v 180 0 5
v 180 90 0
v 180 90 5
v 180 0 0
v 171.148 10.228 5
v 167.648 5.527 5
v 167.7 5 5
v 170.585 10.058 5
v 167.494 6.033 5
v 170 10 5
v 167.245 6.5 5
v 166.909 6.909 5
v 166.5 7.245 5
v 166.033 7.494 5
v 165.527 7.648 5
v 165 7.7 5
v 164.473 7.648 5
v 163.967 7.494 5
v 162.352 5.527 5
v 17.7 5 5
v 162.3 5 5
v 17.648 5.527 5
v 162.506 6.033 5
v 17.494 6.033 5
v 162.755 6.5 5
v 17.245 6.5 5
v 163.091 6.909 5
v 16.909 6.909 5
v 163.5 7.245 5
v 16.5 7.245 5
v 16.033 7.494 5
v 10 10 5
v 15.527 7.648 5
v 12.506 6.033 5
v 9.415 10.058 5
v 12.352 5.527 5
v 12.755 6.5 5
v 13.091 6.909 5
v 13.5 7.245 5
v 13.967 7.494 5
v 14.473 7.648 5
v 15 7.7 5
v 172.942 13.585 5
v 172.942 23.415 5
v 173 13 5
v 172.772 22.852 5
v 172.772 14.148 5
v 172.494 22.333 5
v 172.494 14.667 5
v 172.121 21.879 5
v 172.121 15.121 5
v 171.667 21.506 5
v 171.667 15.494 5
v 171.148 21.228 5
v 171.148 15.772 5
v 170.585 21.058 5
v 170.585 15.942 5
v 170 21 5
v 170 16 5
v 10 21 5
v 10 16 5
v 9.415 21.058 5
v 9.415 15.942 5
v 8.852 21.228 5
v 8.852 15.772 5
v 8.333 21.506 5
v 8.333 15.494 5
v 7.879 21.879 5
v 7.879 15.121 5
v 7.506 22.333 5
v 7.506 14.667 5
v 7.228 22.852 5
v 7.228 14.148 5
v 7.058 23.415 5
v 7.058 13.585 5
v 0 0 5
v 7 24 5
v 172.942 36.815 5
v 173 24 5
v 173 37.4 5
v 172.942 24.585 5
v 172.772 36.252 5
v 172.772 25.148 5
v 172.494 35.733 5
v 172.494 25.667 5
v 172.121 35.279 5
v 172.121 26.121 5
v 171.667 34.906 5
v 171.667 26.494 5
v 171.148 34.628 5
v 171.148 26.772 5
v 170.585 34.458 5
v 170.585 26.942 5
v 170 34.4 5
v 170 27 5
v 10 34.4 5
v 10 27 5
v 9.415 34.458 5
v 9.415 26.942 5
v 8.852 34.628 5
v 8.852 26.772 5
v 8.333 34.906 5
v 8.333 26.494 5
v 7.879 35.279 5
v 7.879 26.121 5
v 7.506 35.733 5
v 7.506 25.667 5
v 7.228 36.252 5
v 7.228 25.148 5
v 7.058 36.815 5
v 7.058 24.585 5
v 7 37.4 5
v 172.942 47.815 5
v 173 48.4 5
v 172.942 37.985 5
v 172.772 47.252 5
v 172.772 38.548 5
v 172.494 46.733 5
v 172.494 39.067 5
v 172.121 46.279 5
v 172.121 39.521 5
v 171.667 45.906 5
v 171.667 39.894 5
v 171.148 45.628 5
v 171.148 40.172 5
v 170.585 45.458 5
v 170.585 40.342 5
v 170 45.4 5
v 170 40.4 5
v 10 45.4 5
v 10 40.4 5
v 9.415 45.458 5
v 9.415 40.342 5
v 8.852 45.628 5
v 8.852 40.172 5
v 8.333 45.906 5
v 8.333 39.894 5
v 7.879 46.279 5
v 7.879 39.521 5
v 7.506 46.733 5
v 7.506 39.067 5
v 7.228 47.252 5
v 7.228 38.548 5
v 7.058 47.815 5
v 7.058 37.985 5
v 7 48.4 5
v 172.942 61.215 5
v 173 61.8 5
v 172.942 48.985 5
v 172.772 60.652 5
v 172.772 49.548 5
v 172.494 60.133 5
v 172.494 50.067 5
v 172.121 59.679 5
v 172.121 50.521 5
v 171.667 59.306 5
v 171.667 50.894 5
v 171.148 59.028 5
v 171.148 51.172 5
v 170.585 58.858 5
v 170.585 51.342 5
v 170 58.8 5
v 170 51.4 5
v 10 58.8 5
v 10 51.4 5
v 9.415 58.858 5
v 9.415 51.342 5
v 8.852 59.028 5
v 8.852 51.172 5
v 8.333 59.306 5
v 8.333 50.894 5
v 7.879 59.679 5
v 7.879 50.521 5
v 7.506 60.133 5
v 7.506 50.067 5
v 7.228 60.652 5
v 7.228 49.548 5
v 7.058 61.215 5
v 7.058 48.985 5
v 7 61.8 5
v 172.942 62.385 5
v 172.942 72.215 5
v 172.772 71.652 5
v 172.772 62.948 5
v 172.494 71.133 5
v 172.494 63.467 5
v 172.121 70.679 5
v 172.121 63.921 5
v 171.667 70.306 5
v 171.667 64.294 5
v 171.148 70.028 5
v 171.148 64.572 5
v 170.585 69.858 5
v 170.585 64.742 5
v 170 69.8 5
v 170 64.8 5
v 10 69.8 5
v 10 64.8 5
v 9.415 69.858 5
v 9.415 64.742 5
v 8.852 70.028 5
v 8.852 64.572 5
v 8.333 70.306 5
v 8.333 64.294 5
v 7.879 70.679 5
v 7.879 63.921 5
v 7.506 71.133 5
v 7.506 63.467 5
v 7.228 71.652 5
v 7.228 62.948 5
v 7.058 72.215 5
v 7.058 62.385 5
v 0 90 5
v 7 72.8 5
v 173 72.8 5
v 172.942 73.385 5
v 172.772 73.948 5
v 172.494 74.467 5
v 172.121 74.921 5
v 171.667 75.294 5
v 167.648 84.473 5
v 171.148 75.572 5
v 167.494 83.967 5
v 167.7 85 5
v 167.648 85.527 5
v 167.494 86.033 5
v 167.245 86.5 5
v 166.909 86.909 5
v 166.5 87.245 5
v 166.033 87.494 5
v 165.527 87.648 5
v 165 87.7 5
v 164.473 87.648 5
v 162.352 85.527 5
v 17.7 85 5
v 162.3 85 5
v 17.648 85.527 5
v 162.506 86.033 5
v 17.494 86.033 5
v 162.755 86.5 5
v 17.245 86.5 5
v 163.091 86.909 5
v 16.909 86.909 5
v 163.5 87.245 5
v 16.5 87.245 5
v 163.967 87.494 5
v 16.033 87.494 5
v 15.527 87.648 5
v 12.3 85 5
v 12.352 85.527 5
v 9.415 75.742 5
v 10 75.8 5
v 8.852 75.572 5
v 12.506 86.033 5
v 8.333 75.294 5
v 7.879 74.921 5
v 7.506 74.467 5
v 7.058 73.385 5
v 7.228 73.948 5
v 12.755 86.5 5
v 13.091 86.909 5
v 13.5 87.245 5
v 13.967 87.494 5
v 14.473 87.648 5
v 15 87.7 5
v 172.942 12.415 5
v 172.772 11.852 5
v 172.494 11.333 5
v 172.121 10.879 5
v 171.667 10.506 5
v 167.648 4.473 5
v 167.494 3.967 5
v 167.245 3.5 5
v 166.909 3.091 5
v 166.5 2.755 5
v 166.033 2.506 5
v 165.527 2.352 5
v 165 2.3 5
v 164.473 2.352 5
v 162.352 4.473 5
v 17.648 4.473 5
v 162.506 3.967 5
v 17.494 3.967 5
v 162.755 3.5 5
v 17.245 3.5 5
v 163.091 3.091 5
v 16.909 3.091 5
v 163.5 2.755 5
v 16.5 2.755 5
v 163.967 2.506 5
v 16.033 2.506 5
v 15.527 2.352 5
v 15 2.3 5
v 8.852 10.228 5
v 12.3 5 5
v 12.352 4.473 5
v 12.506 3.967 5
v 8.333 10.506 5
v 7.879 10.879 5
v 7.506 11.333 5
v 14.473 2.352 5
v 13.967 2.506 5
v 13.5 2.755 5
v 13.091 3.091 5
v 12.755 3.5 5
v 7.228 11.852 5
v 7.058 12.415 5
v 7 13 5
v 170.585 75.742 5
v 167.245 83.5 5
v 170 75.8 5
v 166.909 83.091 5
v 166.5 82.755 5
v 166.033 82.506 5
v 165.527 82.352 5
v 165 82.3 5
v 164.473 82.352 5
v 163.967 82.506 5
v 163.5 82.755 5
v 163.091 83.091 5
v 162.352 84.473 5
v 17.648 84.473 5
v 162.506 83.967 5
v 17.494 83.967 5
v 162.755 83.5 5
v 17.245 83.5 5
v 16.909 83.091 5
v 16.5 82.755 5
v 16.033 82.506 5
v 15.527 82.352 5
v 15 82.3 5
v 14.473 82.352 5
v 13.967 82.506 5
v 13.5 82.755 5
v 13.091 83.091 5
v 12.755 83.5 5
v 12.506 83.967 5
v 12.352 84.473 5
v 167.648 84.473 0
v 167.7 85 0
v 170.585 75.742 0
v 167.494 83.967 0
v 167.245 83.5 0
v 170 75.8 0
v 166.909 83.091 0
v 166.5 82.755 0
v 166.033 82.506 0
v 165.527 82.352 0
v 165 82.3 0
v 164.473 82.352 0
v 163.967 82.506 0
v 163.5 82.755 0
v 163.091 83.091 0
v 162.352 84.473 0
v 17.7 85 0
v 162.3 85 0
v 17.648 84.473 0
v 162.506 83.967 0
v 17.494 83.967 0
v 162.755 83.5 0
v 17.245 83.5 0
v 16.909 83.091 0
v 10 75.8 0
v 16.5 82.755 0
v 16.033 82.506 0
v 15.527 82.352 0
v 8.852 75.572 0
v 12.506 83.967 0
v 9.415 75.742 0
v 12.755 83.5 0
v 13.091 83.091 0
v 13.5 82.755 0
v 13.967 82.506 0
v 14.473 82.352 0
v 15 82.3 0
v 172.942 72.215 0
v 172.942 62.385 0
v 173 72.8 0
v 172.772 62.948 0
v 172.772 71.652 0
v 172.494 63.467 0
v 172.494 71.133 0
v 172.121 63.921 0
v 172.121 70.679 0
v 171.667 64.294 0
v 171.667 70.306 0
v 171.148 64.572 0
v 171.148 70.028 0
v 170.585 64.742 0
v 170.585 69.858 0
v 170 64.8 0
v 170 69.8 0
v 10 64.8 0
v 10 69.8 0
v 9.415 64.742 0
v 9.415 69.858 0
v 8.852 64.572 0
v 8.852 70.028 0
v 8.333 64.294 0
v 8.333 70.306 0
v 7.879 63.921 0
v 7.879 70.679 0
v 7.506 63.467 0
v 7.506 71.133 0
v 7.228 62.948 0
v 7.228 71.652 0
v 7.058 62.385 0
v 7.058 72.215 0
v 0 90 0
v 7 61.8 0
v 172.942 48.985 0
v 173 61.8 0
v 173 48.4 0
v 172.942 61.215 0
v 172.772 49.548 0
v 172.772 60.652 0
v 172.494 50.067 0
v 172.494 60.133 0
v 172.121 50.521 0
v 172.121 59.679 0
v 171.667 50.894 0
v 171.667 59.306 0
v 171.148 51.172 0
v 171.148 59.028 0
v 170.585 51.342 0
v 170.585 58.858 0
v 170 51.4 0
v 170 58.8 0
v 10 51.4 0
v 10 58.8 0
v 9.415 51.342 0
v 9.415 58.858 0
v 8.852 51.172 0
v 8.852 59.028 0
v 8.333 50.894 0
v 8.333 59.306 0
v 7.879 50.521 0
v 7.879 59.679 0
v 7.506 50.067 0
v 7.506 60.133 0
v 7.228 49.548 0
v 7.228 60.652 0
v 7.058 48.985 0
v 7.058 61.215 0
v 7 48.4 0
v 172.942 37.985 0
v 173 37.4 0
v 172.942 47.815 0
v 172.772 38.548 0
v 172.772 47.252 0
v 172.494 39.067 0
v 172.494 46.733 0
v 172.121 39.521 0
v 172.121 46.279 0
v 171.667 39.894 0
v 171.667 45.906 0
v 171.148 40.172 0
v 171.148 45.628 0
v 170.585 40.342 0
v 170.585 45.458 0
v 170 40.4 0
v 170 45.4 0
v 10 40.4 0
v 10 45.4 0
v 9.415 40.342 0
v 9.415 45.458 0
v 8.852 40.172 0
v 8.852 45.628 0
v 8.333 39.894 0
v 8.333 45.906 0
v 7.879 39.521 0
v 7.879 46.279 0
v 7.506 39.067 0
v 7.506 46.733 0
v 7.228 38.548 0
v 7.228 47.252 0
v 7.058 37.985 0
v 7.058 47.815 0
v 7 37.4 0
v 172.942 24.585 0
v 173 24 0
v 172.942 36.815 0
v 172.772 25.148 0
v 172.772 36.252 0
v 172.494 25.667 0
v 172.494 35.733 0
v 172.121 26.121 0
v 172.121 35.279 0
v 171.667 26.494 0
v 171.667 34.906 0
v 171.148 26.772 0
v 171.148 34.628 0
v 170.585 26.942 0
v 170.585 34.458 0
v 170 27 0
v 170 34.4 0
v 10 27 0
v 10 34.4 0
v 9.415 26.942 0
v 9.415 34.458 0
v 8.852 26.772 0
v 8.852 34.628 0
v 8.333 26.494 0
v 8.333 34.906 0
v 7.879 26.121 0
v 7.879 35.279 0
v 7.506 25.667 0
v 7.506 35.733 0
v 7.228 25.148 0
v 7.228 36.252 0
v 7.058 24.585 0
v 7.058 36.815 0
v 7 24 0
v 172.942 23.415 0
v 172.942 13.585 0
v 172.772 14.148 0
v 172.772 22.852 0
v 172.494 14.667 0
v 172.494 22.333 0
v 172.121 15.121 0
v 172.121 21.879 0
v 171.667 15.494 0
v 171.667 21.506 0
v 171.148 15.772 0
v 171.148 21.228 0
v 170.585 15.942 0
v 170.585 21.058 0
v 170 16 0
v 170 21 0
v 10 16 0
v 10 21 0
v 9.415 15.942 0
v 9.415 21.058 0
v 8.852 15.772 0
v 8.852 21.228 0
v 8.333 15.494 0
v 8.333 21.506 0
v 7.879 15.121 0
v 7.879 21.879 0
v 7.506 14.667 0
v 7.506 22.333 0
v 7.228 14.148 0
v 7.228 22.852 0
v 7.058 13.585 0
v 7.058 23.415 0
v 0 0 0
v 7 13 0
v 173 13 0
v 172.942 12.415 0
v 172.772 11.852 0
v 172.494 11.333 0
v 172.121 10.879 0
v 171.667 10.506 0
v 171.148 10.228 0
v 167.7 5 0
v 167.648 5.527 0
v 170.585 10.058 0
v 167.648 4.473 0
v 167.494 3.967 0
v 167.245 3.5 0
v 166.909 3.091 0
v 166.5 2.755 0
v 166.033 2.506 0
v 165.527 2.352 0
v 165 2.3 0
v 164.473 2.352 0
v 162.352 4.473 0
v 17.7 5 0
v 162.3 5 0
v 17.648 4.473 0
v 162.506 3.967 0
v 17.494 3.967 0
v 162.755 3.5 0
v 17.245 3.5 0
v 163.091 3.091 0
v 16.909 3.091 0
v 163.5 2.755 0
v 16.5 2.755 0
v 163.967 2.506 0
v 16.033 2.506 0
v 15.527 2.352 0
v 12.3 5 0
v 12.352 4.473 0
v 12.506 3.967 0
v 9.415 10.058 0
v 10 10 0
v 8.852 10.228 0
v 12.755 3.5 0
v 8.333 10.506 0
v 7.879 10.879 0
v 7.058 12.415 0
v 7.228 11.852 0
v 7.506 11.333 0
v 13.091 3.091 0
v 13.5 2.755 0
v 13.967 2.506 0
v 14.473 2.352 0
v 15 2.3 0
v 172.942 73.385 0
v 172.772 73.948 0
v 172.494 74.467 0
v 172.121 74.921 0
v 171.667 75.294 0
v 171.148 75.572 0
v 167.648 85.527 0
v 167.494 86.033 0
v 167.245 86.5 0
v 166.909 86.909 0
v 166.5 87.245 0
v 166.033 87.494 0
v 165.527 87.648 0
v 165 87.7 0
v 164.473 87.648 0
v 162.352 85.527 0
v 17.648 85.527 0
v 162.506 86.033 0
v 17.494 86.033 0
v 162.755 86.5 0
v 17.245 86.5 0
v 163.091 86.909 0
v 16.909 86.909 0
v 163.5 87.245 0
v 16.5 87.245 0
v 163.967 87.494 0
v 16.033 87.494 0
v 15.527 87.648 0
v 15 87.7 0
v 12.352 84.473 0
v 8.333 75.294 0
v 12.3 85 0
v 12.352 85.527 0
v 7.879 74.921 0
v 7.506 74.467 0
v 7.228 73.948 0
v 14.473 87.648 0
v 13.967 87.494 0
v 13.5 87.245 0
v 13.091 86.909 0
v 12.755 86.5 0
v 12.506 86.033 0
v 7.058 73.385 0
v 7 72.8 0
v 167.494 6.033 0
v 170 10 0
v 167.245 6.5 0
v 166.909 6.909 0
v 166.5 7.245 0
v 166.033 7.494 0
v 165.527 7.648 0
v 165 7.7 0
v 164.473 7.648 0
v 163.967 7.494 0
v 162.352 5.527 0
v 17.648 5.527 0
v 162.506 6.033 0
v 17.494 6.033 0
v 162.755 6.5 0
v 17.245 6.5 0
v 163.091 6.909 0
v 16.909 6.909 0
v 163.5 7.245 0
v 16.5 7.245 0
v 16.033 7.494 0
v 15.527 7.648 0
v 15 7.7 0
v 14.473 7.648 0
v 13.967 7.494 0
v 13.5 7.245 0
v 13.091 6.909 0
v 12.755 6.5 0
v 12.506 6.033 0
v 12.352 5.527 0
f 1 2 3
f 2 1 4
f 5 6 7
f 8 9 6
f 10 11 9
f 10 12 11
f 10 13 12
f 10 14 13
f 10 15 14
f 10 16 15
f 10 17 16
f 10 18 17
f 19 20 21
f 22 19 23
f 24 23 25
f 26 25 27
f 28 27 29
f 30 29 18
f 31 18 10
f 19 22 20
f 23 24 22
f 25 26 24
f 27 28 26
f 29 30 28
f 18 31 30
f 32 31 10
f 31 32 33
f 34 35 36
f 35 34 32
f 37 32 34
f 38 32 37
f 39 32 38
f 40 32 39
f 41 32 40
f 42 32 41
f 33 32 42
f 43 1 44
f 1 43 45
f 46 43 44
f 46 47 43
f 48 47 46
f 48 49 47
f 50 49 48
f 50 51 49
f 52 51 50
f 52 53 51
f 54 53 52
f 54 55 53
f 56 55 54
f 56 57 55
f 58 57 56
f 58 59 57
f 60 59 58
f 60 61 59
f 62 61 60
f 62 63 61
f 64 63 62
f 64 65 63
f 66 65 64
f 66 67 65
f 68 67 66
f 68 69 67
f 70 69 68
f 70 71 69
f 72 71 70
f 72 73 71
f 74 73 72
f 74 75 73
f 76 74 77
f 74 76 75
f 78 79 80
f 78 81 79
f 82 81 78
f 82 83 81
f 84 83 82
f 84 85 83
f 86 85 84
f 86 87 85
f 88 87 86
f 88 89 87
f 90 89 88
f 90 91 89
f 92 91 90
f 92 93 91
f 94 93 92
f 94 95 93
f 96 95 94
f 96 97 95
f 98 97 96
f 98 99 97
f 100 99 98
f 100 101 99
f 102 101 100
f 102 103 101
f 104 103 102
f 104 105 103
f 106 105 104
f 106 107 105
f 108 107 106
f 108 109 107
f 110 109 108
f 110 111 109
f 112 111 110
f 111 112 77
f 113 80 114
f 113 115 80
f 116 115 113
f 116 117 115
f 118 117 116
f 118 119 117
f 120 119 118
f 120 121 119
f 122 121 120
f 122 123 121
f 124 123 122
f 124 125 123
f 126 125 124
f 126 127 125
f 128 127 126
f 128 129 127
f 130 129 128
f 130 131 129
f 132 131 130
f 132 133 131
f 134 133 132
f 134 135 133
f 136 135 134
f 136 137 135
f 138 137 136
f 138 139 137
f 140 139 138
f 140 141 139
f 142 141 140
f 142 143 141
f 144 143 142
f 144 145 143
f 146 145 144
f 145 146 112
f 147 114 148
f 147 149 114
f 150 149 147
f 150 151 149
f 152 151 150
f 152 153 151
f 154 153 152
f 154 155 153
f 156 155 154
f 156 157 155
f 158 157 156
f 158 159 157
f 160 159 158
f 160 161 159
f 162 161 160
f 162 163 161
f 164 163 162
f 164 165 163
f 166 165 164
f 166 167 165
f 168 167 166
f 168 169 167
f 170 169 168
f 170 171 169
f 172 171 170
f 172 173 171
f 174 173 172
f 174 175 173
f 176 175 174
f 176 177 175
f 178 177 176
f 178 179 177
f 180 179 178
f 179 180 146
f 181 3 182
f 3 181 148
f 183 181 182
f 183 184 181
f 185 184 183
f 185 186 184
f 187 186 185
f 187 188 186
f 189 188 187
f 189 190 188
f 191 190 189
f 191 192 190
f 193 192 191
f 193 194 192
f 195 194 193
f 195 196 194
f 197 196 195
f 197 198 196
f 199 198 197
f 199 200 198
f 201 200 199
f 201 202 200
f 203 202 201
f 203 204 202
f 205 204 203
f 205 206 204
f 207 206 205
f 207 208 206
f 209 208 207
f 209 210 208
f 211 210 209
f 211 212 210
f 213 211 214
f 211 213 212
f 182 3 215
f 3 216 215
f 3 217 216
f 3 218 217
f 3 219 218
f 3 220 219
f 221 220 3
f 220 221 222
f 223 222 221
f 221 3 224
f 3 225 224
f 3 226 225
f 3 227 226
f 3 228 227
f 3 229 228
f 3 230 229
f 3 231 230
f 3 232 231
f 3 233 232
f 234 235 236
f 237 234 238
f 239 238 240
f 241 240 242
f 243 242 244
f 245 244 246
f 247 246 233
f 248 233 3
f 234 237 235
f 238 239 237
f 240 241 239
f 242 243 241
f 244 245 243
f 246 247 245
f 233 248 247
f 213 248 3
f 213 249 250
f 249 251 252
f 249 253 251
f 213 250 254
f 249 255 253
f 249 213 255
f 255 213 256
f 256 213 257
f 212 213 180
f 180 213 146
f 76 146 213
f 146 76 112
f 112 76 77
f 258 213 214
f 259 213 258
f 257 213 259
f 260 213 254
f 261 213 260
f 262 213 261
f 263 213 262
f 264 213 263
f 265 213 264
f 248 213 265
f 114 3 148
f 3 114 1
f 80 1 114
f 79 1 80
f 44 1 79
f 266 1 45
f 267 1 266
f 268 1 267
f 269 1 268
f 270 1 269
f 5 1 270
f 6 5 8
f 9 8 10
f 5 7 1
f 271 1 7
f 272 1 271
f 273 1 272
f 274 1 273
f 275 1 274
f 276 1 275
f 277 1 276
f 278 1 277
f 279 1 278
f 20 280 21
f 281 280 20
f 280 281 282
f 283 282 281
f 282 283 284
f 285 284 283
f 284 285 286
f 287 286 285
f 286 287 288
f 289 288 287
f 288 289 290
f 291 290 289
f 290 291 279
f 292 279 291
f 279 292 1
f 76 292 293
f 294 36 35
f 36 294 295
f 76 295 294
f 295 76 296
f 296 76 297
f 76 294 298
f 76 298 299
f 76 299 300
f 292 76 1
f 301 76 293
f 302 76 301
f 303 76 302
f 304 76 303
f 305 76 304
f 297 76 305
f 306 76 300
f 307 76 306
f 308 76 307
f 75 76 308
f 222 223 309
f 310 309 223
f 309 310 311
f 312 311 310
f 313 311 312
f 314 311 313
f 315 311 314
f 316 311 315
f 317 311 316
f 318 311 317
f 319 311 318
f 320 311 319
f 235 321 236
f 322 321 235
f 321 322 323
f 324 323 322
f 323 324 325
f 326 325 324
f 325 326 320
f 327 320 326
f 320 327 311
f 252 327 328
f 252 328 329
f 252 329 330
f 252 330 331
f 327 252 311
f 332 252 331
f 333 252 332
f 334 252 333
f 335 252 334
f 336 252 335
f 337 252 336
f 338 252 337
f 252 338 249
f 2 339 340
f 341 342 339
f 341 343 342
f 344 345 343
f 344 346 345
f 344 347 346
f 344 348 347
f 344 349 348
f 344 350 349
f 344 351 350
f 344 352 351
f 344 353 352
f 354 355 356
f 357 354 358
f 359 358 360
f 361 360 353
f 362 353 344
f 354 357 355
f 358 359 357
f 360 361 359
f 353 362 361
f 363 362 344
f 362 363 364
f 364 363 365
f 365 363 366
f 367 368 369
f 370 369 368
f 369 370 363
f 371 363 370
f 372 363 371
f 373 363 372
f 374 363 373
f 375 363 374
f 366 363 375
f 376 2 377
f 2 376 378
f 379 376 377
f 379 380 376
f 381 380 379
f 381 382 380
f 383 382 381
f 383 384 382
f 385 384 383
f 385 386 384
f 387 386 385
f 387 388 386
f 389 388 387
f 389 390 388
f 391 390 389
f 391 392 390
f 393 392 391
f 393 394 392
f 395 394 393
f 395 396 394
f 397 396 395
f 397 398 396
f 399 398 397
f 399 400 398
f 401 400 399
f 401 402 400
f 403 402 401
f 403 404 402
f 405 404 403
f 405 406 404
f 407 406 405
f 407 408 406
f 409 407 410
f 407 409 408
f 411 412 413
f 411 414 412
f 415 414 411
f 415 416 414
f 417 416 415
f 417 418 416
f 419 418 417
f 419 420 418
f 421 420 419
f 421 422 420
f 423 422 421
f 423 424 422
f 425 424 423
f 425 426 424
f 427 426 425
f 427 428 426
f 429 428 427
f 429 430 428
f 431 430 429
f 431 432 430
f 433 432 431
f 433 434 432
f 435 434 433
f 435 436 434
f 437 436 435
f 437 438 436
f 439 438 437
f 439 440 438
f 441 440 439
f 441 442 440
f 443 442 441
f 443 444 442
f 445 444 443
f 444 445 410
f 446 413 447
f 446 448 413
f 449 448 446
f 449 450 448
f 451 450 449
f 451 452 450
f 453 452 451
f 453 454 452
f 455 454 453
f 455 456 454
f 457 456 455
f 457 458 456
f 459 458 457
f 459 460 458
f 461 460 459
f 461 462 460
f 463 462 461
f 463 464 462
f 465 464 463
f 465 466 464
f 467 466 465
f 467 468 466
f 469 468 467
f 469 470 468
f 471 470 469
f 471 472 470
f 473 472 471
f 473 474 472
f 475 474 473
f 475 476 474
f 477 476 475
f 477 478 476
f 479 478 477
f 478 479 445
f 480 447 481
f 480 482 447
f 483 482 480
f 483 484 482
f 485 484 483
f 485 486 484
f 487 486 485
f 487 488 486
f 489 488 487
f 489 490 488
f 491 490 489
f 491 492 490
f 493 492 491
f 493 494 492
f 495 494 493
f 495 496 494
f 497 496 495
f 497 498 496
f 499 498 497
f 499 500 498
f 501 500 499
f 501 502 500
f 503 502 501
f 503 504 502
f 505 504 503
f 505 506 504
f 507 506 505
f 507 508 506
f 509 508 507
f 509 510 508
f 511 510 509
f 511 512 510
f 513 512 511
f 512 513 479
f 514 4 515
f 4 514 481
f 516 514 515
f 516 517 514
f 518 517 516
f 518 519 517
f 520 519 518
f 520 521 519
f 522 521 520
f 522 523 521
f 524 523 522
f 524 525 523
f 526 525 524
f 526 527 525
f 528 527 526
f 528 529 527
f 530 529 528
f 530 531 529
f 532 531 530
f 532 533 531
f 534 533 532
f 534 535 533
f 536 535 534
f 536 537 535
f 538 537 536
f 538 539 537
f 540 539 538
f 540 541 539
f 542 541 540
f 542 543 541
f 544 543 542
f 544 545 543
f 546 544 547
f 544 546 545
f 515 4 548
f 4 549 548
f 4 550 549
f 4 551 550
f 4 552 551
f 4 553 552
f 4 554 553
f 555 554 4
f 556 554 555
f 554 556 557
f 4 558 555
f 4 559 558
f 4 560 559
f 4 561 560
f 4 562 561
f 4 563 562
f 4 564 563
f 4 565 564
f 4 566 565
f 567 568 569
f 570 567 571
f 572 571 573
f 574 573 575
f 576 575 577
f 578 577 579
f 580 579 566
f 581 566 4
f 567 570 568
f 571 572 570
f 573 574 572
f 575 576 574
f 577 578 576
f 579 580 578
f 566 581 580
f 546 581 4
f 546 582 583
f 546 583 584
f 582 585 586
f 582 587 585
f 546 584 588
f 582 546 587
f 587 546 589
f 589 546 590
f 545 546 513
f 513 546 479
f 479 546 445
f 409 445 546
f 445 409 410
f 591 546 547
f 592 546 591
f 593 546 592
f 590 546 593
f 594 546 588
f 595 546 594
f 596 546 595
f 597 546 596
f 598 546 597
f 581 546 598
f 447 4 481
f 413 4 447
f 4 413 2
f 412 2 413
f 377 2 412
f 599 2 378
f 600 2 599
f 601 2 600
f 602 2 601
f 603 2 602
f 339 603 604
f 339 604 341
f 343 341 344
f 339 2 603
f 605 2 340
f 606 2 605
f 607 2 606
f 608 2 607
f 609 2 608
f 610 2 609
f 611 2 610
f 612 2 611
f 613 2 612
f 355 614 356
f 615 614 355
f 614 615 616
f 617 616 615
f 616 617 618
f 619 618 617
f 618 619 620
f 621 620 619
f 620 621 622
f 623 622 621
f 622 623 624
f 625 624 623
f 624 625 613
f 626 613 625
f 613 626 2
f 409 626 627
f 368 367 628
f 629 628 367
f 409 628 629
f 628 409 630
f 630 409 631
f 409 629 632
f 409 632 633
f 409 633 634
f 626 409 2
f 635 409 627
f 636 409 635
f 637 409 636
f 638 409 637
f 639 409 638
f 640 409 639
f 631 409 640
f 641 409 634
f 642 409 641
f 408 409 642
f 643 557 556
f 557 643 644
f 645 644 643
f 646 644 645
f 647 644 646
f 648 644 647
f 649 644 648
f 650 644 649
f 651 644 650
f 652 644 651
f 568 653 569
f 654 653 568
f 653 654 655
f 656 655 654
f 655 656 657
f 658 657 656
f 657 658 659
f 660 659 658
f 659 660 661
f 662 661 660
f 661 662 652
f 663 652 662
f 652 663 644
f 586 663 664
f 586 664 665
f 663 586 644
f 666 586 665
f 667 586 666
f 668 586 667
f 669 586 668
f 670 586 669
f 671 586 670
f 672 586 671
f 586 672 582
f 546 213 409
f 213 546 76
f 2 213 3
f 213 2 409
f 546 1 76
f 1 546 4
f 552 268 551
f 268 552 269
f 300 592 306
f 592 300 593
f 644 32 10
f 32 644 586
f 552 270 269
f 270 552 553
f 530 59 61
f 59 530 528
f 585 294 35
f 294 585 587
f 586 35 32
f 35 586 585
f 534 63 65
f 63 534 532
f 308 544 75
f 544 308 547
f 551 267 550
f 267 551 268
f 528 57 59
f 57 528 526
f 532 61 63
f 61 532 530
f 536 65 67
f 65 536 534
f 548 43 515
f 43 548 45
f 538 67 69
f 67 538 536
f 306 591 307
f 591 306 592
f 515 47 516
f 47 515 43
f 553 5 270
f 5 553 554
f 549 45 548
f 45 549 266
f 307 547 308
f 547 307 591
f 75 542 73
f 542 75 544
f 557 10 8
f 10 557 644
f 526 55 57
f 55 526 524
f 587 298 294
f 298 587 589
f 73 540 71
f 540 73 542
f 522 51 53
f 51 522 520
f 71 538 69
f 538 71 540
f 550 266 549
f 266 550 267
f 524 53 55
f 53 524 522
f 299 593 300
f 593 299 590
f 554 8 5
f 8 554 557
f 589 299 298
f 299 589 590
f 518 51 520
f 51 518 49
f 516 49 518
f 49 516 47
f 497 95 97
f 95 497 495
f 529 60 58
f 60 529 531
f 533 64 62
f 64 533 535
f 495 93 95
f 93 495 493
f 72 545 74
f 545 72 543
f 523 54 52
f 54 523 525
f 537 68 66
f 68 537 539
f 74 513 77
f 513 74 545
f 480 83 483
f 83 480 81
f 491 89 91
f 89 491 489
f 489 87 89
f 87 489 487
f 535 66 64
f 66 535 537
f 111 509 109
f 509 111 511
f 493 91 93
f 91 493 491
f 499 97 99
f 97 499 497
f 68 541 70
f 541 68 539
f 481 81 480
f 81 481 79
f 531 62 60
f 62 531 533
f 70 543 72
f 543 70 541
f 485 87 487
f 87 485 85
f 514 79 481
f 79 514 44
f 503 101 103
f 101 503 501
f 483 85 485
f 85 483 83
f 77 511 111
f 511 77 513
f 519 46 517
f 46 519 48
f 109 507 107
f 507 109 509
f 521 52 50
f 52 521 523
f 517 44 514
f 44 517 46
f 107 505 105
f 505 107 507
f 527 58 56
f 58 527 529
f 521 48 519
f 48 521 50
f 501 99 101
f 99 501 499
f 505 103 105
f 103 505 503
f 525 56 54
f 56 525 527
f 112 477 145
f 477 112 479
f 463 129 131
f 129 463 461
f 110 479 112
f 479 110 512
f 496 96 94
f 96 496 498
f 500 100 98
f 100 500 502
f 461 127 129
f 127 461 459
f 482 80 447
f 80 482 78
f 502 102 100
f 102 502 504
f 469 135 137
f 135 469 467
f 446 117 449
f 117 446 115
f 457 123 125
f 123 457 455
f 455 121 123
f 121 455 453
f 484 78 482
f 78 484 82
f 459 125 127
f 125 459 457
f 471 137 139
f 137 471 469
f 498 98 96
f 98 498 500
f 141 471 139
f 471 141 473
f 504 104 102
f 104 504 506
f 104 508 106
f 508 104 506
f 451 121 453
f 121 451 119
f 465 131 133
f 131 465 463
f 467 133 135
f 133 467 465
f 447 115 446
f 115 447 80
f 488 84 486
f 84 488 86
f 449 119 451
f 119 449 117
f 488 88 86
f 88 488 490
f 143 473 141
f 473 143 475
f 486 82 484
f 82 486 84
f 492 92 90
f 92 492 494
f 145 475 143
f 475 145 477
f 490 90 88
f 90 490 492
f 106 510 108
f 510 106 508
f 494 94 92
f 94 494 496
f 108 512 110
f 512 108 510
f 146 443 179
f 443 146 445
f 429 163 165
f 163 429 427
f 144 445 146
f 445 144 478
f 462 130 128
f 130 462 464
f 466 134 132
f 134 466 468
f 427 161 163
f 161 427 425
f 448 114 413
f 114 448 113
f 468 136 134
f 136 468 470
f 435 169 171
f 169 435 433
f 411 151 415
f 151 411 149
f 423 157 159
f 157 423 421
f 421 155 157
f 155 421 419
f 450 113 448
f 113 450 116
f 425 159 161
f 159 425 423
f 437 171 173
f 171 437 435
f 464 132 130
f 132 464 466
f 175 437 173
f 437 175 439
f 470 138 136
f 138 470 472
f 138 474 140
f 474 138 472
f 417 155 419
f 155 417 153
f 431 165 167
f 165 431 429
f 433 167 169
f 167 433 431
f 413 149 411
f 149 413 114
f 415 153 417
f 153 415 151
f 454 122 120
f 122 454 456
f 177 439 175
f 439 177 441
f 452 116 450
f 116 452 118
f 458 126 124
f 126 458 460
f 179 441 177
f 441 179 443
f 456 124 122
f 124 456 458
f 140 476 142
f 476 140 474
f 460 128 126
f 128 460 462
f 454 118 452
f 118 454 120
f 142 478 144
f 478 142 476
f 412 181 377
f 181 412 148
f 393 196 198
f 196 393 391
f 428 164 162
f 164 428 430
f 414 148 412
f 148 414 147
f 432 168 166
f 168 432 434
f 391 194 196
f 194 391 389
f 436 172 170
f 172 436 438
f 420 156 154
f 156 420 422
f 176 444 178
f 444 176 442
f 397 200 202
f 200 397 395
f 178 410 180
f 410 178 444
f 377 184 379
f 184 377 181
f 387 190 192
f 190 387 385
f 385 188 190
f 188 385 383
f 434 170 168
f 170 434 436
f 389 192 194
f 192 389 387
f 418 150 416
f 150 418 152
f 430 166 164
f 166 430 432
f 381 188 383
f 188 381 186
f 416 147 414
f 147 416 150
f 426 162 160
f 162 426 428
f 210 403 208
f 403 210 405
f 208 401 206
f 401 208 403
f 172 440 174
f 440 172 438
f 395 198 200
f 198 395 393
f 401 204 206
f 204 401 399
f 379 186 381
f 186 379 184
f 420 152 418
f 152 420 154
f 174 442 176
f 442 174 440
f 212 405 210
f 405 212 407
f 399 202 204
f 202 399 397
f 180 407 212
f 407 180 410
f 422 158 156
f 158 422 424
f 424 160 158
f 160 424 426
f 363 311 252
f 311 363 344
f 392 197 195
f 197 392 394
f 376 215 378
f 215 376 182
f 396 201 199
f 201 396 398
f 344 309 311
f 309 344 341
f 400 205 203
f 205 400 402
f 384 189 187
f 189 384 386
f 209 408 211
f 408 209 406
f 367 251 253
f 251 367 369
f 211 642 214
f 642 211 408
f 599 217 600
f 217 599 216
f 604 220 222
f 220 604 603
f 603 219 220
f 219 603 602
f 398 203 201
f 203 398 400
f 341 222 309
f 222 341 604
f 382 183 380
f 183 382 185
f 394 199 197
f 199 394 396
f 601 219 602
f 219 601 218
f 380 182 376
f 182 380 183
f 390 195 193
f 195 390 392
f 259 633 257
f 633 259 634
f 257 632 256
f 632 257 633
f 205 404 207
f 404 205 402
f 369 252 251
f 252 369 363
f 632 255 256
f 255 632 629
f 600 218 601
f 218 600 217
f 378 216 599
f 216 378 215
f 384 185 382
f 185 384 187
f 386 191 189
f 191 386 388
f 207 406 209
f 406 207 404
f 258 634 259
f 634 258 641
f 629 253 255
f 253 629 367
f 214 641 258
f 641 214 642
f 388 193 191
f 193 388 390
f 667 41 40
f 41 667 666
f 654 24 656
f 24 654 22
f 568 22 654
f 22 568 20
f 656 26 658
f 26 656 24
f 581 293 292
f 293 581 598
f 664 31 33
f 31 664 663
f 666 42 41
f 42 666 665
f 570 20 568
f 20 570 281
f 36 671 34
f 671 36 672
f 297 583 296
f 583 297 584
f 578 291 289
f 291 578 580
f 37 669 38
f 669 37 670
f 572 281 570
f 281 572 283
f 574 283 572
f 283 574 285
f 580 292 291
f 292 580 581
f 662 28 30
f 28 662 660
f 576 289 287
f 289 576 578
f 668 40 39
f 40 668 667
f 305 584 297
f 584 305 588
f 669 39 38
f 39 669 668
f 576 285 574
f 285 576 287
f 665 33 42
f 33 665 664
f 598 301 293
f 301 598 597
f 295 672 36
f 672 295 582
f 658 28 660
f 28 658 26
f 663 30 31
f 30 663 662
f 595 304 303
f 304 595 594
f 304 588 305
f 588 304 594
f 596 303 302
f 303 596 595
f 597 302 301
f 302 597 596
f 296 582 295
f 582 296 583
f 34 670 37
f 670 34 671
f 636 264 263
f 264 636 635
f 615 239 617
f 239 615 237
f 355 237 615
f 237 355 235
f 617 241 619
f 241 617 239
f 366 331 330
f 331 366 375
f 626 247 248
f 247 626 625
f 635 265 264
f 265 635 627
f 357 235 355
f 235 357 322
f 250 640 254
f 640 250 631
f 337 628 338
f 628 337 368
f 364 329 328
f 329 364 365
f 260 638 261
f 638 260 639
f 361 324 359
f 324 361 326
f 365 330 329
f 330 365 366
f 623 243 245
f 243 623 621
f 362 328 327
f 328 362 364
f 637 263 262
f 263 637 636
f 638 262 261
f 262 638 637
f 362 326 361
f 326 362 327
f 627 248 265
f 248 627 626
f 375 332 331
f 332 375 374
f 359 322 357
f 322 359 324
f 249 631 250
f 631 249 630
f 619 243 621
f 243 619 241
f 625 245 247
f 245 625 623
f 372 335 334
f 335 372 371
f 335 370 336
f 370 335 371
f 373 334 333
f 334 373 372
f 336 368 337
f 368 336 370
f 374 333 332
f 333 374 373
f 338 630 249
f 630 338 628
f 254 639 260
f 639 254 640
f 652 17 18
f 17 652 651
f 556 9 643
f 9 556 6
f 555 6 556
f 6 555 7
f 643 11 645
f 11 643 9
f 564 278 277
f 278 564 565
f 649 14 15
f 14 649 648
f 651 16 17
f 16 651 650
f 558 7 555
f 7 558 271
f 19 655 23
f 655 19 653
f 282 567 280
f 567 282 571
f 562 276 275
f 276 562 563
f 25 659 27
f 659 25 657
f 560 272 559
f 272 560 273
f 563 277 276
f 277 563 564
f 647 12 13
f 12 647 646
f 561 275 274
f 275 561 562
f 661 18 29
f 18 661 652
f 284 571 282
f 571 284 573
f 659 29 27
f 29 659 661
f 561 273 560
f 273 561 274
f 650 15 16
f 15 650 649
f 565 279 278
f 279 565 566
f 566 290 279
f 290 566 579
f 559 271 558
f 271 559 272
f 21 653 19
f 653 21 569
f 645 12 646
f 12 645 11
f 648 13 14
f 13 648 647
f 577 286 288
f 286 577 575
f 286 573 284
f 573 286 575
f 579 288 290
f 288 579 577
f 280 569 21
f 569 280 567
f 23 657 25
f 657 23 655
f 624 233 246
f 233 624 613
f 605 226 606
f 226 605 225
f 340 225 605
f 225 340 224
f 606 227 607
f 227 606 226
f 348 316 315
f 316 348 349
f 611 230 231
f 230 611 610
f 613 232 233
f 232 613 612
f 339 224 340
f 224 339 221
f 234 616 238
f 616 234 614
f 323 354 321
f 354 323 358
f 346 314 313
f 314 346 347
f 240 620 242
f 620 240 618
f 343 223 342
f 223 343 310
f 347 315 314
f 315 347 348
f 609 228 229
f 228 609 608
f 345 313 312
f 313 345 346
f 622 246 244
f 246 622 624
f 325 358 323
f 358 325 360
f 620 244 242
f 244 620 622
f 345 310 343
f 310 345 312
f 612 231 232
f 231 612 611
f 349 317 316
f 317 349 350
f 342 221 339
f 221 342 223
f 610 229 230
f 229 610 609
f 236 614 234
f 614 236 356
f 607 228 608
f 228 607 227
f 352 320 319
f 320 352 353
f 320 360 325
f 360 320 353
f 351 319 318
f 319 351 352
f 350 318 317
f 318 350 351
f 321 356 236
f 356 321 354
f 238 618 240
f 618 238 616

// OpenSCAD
$fn = 32;

// ----------------------------------------------------------------------
// Slotted panel: 180 x 90 mm, 6 рядов of slots
// ----------------------------------------------------------------------

// --- parameters (mm) ---
panel_w = 180;            // panel width
panel_d = 90;             // panel depth
thick = 5;                // panel thickness
slot_w = 6;               // slot width
pitch0 = 11;              // first row pitch
pitch_step = 2.4;         // pitch increase per row
margin = 10;              // margin around the slot field
rows = 6;                 // number of slot rows
mount_d = 5.4;            // mounting holes
mount_x = 75;             // mounting hole offset

difference() {
  union() {
    cube([panel_w, panel_d, thick]);
  }
  /* slot rows: stadium shaped cutters, 2.5 mm clear of both faces */
  /* row 0: pitch 11, length 160 */
  hull() {
    translate([10, 13, -2.5]) cylinder(h = thick + 5, d = slot_w);
    translate([170, 13, -2.5]) cylinder(h = thick + 5, d = slot_w);
  }
  /* row 1: pitch 13.4, length 160 */
  hull() {
    translate([10, 24, -2.5]) cylinder(h = thick + 5, d = slot_w);
    translate([170, 24, -2.5]) cylinder(h = thick + 5, d = slot_w);
  }
  /* row 2: pitch 11, length 160 */
  hull() {
    translate([10, 37.4, -2.5]) cylinder(h = thick + 5, d = slot_w);
    translate([170, 37.4, -2.5]) cylinder(h = thick + 5, d = slot_w);
  }
  /* row 3: pitch 13.4, length 160 */
  hull() {
    translate([10, 48.4, -2.5]) cylinder(h = thick + 5, d = slot_w);
    translate([170, 48.4, -2.5]) cylinder(h = thick + 5, d = slot_w);
  }
  /* row 4: pitch 11, length 160 */
  hull() {
    translate([10, 61.8, -2.5]) cylinder(h = thick + 5, d = slot_w);
    translate([170, 61.8, -2.5]) cylinder(h = thick + 5, d = slot_w);
  }
  /* row 5: pitch 13.4, length 160 */
  hull() {
    translate([10, 72.8, -2.5]) cylinder(h = thick + 5, d = slot_w);
    translate([170, 72.8, -2.5]) cylinder(h = thick + 5, d = slot_w);
  }
  translate([15, 5, -2.5]) cylinder(h = 10, d = mount_d);
  translate([15, 85, -2.5]) cylinder(h = 10, d = mount_d);
  translate([165, 5, -2.5]) cylinder(h = 10, d = mount_d);
  translate([165, 85, -2.5]) cylinder(h = 10, d = mount_d);
}
